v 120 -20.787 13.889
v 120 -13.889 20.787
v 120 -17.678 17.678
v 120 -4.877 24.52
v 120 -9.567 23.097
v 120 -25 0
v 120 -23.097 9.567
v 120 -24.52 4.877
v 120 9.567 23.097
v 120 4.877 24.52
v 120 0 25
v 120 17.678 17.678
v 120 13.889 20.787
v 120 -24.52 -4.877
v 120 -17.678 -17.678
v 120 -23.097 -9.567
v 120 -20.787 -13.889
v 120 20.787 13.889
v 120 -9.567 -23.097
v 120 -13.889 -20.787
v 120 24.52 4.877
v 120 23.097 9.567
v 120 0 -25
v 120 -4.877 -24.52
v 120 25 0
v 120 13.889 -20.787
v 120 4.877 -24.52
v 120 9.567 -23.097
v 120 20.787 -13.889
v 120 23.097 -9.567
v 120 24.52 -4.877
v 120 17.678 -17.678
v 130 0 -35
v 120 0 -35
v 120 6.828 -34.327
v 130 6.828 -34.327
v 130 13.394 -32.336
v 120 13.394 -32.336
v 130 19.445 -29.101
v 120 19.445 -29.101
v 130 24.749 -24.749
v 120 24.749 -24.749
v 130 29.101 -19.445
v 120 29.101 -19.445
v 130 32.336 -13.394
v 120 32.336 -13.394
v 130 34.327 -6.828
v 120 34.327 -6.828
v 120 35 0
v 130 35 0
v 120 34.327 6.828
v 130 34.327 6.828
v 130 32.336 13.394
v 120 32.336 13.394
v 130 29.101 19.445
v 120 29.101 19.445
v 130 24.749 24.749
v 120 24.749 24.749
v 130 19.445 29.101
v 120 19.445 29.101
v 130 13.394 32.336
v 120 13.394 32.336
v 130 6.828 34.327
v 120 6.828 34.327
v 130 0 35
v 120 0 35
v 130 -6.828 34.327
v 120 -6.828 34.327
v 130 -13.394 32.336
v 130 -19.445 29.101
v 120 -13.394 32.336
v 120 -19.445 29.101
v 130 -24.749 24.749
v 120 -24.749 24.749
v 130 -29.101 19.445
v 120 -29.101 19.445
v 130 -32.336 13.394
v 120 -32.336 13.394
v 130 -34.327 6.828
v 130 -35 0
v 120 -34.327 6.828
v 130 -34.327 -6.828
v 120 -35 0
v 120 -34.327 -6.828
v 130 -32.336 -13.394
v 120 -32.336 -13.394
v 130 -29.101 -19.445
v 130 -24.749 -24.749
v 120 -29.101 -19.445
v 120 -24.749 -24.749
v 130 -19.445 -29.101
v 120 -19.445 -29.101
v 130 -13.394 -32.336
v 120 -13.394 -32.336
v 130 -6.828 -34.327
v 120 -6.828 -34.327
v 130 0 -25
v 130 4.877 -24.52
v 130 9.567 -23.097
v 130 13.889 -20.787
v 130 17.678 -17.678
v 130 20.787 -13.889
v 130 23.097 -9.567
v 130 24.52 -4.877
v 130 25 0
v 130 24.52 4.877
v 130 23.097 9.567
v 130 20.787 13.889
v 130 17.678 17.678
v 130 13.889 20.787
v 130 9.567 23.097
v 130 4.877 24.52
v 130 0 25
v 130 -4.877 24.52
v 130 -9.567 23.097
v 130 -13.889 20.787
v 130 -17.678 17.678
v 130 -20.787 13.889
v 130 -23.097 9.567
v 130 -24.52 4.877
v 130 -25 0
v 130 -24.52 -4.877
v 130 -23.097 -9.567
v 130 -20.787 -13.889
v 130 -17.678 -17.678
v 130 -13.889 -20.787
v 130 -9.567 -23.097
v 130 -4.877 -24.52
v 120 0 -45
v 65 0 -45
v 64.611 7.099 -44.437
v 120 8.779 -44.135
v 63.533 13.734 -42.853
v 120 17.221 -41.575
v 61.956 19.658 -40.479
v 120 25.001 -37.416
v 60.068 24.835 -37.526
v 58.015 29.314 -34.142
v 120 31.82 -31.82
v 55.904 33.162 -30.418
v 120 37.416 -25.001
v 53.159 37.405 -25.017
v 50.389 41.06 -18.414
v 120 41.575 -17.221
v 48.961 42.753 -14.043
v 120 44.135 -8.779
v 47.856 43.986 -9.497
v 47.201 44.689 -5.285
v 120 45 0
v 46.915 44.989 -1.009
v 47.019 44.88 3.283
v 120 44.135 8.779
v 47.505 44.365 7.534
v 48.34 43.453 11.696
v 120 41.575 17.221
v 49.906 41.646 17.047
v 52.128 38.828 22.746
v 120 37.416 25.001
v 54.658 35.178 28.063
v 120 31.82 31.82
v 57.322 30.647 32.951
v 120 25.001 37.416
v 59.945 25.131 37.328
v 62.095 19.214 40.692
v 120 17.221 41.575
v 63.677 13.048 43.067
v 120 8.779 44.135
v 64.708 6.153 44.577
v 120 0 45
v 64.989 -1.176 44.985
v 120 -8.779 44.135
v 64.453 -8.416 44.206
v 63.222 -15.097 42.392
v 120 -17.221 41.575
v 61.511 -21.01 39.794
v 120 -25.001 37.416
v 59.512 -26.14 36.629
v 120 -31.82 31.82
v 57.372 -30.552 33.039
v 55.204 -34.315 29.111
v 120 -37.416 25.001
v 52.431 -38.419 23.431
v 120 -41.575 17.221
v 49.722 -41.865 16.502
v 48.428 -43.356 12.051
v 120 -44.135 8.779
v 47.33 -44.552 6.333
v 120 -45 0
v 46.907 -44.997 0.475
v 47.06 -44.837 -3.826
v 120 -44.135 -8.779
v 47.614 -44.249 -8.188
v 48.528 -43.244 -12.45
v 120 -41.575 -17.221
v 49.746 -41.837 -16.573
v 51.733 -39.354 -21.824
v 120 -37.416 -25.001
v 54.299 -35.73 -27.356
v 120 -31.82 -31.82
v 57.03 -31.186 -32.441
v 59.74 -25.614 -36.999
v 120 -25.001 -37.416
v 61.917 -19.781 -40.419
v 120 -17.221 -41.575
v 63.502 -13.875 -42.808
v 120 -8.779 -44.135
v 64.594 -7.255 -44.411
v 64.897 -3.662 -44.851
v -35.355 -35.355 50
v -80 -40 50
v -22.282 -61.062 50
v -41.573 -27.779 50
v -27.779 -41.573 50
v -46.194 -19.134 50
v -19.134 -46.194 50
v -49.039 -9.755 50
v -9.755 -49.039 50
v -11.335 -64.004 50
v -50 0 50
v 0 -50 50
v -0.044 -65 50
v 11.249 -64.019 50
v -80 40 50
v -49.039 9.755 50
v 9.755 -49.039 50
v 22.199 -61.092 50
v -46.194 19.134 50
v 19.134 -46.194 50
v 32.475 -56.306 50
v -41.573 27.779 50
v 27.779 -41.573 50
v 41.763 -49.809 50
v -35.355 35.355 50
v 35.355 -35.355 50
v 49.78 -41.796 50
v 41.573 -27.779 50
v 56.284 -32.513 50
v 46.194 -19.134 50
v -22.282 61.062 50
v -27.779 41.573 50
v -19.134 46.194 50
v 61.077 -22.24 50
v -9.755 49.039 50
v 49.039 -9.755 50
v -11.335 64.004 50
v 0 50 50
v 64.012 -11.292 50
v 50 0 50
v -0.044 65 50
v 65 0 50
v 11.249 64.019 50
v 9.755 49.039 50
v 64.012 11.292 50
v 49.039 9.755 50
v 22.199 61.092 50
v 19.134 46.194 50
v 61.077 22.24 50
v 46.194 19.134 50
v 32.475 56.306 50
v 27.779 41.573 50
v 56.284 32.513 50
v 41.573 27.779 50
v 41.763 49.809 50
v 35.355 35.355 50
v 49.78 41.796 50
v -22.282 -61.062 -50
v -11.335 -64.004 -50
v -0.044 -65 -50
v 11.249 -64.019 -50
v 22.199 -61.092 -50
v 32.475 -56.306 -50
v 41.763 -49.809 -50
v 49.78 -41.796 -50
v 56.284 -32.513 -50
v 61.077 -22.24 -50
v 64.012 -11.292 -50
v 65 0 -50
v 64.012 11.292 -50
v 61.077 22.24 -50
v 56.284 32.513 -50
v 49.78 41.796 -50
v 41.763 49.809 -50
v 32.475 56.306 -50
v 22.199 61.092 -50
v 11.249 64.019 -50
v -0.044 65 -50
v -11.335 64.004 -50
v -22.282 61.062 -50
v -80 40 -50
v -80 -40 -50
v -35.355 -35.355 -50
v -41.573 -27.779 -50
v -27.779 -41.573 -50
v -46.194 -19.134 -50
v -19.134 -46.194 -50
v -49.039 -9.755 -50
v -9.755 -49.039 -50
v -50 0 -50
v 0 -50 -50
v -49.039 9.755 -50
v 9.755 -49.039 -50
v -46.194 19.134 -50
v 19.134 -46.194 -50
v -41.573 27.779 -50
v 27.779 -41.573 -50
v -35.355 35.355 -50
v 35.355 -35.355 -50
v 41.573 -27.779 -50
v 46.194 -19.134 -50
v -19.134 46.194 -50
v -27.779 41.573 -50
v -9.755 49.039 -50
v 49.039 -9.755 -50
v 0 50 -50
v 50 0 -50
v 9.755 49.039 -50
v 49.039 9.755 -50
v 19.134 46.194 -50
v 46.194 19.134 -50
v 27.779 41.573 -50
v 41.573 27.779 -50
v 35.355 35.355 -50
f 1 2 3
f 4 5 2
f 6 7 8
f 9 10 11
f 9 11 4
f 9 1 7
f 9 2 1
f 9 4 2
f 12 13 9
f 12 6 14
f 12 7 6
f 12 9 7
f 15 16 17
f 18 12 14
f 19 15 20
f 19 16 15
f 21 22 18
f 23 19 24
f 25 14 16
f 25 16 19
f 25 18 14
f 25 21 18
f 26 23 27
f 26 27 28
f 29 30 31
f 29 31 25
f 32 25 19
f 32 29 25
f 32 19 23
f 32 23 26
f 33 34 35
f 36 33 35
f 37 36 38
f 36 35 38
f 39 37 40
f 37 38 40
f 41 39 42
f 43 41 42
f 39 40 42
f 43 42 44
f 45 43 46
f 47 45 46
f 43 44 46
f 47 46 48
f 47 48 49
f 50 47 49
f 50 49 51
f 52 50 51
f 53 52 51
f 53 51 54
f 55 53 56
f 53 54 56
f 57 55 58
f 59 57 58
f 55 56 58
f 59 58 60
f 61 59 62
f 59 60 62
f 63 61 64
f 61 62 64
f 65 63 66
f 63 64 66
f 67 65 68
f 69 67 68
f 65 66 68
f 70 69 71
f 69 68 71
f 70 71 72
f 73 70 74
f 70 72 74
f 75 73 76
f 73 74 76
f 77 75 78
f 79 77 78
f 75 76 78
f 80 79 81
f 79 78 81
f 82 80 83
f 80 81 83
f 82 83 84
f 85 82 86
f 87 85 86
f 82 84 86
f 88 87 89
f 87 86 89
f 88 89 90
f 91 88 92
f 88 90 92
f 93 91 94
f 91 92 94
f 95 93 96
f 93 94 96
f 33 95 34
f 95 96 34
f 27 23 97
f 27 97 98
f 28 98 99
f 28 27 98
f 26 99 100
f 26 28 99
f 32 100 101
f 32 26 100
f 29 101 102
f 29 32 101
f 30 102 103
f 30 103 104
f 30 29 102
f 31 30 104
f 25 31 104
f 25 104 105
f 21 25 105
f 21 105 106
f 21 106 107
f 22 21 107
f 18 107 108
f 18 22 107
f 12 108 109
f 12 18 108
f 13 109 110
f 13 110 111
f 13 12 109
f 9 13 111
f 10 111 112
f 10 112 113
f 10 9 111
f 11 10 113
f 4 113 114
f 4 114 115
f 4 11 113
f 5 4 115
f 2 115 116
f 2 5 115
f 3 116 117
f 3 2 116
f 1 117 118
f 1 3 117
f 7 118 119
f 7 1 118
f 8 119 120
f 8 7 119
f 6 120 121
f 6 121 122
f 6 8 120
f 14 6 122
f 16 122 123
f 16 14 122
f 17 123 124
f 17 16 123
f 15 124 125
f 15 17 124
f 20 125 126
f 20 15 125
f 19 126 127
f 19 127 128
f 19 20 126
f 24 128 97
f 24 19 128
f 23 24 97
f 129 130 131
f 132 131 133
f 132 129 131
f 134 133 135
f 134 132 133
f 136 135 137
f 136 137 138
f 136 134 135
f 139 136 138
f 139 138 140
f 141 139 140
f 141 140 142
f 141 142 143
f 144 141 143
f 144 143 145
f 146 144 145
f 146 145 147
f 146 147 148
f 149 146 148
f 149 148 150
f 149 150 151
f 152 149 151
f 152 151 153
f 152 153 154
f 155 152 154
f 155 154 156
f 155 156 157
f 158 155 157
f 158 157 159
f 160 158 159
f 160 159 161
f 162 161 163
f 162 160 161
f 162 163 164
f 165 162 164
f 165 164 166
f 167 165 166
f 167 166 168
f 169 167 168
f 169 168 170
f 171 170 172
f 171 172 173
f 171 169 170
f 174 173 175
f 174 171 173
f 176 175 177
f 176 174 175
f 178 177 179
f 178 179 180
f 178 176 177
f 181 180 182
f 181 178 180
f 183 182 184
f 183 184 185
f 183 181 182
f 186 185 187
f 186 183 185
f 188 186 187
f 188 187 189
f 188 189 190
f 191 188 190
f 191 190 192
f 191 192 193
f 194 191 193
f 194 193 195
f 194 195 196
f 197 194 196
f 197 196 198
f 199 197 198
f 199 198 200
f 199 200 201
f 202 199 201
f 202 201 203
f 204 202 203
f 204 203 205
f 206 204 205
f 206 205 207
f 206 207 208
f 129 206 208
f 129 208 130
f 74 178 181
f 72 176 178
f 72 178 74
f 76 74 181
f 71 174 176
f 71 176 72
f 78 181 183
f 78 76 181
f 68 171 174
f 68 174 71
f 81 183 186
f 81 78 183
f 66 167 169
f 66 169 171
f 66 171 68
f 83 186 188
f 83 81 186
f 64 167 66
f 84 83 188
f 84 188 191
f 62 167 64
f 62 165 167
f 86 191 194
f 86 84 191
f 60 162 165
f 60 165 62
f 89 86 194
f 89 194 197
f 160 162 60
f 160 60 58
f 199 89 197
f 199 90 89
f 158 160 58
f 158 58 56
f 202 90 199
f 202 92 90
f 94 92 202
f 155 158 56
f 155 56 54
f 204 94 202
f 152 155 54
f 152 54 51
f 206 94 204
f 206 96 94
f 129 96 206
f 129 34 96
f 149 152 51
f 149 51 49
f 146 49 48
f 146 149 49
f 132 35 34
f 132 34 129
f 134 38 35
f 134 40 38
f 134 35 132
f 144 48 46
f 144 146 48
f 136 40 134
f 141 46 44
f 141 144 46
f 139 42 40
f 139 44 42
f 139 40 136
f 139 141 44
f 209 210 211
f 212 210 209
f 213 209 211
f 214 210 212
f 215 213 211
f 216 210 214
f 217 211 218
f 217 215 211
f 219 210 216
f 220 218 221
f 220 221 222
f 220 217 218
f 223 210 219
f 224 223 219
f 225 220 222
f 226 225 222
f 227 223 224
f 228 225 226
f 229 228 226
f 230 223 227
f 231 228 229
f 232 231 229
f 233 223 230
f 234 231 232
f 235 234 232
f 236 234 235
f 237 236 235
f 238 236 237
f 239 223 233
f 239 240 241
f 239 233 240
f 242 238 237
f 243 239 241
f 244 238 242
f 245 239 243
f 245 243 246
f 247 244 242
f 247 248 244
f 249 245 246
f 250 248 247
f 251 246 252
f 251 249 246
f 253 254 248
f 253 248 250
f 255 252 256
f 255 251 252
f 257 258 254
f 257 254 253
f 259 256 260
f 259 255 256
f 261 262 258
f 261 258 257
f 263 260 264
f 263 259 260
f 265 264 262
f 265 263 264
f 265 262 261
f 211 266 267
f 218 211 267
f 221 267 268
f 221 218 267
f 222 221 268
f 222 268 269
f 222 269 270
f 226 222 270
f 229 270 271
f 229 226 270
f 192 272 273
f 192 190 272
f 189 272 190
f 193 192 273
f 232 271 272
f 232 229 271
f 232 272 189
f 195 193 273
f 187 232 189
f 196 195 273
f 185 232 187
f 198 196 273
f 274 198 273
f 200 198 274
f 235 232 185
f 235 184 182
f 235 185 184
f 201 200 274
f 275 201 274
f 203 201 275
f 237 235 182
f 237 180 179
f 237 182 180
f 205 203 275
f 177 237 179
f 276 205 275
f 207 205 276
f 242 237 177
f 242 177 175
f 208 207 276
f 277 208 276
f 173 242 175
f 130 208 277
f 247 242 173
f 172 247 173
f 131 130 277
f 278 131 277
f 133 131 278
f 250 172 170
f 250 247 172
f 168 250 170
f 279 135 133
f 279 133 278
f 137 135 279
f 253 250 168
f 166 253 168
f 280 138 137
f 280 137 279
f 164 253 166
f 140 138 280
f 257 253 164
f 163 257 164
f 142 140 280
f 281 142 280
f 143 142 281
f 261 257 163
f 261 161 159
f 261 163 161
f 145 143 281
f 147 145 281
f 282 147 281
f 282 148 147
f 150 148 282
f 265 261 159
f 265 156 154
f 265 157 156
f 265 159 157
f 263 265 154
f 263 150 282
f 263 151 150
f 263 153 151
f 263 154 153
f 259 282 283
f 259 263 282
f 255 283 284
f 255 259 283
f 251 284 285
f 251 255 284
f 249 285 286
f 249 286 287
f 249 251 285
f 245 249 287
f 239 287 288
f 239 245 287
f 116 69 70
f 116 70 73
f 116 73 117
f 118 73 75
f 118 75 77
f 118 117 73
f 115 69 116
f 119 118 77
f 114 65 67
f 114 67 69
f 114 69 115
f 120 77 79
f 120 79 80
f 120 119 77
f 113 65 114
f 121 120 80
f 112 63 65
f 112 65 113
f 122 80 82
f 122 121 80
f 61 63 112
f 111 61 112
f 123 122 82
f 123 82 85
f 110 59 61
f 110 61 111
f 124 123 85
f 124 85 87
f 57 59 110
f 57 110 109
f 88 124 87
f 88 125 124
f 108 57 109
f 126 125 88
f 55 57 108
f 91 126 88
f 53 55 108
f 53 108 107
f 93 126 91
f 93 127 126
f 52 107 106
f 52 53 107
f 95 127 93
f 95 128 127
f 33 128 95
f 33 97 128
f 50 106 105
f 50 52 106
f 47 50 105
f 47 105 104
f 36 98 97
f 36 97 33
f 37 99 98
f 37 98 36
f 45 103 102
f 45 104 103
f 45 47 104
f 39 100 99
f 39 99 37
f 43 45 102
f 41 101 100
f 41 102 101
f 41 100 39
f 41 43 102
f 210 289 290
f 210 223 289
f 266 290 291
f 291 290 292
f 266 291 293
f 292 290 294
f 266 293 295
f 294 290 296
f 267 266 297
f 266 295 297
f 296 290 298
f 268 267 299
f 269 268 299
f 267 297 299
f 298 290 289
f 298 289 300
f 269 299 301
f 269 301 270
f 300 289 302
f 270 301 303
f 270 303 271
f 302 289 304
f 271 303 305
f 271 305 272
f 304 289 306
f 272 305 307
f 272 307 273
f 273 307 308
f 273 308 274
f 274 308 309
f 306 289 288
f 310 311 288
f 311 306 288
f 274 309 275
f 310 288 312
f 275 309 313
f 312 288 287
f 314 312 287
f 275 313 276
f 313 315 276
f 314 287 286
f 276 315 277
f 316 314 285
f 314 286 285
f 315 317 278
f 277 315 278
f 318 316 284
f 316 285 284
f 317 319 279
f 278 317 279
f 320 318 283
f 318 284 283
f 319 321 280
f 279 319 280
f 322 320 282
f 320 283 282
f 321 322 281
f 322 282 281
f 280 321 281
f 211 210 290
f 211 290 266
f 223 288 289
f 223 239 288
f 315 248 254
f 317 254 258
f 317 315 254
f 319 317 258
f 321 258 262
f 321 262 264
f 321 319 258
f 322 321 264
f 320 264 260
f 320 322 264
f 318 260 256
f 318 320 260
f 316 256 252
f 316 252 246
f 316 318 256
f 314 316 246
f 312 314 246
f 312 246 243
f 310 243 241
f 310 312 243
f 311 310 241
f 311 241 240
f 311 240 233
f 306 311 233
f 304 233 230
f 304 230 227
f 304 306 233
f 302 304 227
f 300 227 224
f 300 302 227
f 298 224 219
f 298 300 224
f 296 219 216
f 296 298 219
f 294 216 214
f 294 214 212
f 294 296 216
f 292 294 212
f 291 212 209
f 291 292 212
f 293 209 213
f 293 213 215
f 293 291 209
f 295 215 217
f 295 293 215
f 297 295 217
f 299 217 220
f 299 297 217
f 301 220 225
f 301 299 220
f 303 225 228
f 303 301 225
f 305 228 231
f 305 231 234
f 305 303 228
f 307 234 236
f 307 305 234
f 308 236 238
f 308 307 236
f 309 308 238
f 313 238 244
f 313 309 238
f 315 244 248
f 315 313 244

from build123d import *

# Parameters (mm, degrees)
SKETCH_1_R      = 50
EXTRUDE_1_DEPTH = 50
EXTRUDE_2_REACH = 202
SKETCH_2_R      = 45
SKETCH_3_R      = 35
SKETCH_3_R_2    = 25
EXTRUDE_3_DEPTH = 10


with BuildPart() as part:
    # 草图1 → 凸台-拉伸1 (new body, symmetric)
    with BuildSketch(Plane.XY):
        with BuildLine():
            Line((-80, 40), (-80, -40))
            Line((-80, -40), (-22.281665693, -61.061668614))
            ThreePointArc((-22.281665693, -61.061668614), (65, 0), (-22.281665693, 61.061668614))
            Line((-22.281665693, 61.061668614), (-80, 40))
        make_face()
        Circle(SKETCH_1_R, mode=Mode.SUBTRACT)
    extrude(amount=EXTRUDE_1_DEPTH, both=True)

    # 草图2 → 凸台-拉伸2 (add, up to next)
    with BuildSketch(Plane(origin=(120, 0, 0), x_dir=(0, 0, -1), z_dir=(1, 0, 0)), mode=Mode.PRIVATE) as extrude_2_sk1:
        Circle(SKETCH_2_R)
    extrude_2_tool1 = extrude(extrude_2_sk1.sketch, amount=-EXTRUDE_2_REACH, mode=Mode.PRIVATE) - part.part
    add(extrude_2_tool1.solids().sort_by_distance((120, 0, 0))[0])

    # 草图3 → 凸台-拉伸3 (add)
    with BuildSketch(Plane(origin=(120, 0, 0), x_dir=(0, 0, -1), z_dir=(1, 0, 0))):
        Circle(SKETCH_3_R)
        Circle(SKETCH_3_R_2, mode=Mode.SUBTRACT)
    extrude(amount=EXTRUDE_3_DEPTH)


solid = part.part
